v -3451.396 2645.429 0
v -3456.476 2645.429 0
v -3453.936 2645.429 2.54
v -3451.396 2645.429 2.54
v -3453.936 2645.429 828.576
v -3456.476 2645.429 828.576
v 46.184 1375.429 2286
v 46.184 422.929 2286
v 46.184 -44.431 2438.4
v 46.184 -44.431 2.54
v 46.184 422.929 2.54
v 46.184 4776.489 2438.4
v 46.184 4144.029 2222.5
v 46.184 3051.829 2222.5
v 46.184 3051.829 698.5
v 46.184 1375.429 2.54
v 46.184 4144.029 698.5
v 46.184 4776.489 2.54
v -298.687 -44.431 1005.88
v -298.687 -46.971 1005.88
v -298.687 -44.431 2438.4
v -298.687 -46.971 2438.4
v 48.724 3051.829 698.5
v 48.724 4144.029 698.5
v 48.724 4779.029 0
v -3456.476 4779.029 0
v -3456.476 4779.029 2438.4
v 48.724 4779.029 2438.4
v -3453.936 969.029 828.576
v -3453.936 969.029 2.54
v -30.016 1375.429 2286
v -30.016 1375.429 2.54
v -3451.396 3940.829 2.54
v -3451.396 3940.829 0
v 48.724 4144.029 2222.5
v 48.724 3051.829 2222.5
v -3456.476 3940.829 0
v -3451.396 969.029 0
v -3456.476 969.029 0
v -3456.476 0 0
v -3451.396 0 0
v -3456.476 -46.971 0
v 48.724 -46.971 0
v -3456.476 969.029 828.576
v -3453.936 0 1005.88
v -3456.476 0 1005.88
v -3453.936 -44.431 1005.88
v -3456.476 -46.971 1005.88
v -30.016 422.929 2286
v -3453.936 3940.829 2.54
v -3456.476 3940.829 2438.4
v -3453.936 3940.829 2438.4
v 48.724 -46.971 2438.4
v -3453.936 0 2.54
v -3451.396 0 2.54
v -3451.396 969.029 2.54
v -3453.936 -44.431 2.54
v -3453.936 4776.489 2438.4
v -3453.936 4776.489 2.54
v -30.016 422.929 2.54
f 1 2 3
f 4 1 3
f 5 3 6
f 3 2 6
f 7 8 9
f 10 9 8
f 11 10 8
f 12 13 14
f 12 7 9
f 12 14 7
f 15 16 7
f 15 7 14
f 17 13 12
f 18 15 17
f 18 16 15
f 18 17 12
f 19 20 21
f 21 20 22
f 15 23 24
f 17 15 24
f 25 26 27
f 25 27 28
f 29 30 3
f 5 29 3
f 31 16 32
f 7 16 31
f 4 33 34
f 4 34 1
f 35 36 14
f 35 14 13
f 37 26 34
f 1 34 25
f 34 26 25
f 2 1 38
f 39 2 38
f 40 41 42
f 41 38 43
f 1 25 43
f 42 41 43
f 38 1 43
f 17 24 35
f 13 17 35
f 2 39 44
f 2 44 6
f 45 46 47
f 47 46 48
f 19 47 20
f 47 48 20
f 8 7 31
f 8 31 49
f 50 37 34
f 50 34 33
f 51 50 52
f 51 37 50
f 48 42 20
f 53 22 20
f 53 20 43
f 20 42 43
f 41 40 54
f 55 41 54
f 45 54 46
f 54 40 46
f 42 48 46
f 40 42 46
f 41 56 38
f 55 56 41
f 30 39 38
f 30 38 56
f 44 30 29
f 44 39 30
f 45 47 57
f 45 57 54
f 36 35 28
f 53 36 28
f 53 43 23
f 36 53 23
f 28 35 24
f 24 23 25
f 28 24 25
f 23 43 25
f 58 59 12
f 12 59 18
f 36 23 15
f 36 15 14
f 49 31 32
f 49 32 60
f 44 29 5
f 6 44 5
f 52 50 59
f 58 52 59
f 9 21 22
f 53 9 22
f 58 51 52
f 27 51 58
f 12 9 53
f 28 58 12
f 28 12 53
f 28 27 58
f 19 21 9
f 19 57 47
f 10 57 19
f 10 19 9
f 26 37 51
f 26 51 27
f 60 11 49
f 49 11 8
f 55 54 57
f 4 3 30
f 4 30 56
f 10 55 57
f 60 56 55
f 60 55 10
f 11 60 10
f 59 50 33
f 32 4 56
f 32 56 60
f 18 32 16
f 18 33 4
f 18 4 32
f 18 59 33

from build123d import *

# Parameters (mm, degrees)
F0_W      = 3505.2
F0_H      = 4826
F1_DEPTH  = 2438.4
F2_T      = -2.54
F3_W      = 1295.4
F3_H      = 2438.4
F3_W_2    = 969.0292786658
F4_DEPTH  = 5.08
F5_W      = 1092.2
F5_H      = 1524
F6_DEPTH  = 25.4
F7_W      = 952.5
F7_H      = 2286
F8_DEPTH  = 76.2
F10_R     = 279.4
F11_DEPTH = 304.8
F13_W     = 1676.4
F13_H     = 1609.8242696762
F14_DEPTH = 25.4
F15_W     = 3953.6780118942
F15_H     = 1432.5200017929
F16_DEPTH = 127


with BuildPart() as f1:
    # F0 (on Top) → F1 (new body)
    with BuildSketch(Plane.XY):
        with Locations((-1703.8764625251, 2366.0292786658)):
            Rectangle(F0_W, F0_H)
    extrude(amount=F1_DEPTH)

    # F2
    f2_openings = [f1.faces().sort_by_distance(p)[0] for p in [
        (-1703.876463, 2366.029279, 2438.4),
    ]]
    offset(amount=F2_T, openings=f2_openings)

    # F3 (on face) → F4 (cut)
    with BuildSketch(Plane(origin=(-3456.4764625251, 0, 0), x_dir=(0, -1, 0), z_dir=(-1, 0, 0))):
        with Locations((-3293.1292786658, 1219.2)):
            Rectangle(F3_W, F3_H)
        with Locations((-484.5146393329, 1219.2)):
            Rectangle(F3_W_2, F3_H)
    extrude(amount=-F4_DEPTH, mode=Mode.SUBTRACT)

    # F5 (on face) → F6 (cut)
    with BuildSketch(Plane.YZ.offset(48.7235374749)):
        with Locations((3597.9292786658, 1460.5)):
            Rectangle(F5_W, F5_H)
    extrude(amount=-F6_DEPTH, mode=Mode.SUBTRACT)

    # F7 (on face) → F8 (join)
    with BuildSketch(Plane(origin=(46.1835374749, 0, 0), x_dir=(0, -1, 0), z_dir=(-1, 0, 0))):
        with Locations((-899.1792786658, 1143)):
            Rectangle(F7_W, F7_H)
    extrude(amount=F8_DEPTH)

    # F13 (on face) → F14 (cut)
    with BuildSketch(Plane.YZ.offset(-3453.9364625251)):
        with Locations((1807.2292786658, 1633.4878651619)):
            Rectangle(F13_W, F13_H)
    extrude(amount=-F14_DEPTH, mode=Mode.SUBTRACT)

    # F15 (on face) → F16 (cut)
    with BuildSketch(Plane.XZ.offset(46.9707213342)):
        with Locations((-2275.5261063576, 1722.1399991035)):
            Rectangle(F15_W, F15_H)
    extrude(amount=-F16_DEPTH, mode=Mode.SUBTRACT)


with BuildPart() as f11:
    # F10 (on offset) → F11 (new body)
    with BuildSketch(Plane.XY.offset(1727.2)):
        with Locations((-3387.9356384277, -986.3669872284)):
            Circle(F10_R)
    extrude(amount=-F11_DEPTH)


solid = f1.part
